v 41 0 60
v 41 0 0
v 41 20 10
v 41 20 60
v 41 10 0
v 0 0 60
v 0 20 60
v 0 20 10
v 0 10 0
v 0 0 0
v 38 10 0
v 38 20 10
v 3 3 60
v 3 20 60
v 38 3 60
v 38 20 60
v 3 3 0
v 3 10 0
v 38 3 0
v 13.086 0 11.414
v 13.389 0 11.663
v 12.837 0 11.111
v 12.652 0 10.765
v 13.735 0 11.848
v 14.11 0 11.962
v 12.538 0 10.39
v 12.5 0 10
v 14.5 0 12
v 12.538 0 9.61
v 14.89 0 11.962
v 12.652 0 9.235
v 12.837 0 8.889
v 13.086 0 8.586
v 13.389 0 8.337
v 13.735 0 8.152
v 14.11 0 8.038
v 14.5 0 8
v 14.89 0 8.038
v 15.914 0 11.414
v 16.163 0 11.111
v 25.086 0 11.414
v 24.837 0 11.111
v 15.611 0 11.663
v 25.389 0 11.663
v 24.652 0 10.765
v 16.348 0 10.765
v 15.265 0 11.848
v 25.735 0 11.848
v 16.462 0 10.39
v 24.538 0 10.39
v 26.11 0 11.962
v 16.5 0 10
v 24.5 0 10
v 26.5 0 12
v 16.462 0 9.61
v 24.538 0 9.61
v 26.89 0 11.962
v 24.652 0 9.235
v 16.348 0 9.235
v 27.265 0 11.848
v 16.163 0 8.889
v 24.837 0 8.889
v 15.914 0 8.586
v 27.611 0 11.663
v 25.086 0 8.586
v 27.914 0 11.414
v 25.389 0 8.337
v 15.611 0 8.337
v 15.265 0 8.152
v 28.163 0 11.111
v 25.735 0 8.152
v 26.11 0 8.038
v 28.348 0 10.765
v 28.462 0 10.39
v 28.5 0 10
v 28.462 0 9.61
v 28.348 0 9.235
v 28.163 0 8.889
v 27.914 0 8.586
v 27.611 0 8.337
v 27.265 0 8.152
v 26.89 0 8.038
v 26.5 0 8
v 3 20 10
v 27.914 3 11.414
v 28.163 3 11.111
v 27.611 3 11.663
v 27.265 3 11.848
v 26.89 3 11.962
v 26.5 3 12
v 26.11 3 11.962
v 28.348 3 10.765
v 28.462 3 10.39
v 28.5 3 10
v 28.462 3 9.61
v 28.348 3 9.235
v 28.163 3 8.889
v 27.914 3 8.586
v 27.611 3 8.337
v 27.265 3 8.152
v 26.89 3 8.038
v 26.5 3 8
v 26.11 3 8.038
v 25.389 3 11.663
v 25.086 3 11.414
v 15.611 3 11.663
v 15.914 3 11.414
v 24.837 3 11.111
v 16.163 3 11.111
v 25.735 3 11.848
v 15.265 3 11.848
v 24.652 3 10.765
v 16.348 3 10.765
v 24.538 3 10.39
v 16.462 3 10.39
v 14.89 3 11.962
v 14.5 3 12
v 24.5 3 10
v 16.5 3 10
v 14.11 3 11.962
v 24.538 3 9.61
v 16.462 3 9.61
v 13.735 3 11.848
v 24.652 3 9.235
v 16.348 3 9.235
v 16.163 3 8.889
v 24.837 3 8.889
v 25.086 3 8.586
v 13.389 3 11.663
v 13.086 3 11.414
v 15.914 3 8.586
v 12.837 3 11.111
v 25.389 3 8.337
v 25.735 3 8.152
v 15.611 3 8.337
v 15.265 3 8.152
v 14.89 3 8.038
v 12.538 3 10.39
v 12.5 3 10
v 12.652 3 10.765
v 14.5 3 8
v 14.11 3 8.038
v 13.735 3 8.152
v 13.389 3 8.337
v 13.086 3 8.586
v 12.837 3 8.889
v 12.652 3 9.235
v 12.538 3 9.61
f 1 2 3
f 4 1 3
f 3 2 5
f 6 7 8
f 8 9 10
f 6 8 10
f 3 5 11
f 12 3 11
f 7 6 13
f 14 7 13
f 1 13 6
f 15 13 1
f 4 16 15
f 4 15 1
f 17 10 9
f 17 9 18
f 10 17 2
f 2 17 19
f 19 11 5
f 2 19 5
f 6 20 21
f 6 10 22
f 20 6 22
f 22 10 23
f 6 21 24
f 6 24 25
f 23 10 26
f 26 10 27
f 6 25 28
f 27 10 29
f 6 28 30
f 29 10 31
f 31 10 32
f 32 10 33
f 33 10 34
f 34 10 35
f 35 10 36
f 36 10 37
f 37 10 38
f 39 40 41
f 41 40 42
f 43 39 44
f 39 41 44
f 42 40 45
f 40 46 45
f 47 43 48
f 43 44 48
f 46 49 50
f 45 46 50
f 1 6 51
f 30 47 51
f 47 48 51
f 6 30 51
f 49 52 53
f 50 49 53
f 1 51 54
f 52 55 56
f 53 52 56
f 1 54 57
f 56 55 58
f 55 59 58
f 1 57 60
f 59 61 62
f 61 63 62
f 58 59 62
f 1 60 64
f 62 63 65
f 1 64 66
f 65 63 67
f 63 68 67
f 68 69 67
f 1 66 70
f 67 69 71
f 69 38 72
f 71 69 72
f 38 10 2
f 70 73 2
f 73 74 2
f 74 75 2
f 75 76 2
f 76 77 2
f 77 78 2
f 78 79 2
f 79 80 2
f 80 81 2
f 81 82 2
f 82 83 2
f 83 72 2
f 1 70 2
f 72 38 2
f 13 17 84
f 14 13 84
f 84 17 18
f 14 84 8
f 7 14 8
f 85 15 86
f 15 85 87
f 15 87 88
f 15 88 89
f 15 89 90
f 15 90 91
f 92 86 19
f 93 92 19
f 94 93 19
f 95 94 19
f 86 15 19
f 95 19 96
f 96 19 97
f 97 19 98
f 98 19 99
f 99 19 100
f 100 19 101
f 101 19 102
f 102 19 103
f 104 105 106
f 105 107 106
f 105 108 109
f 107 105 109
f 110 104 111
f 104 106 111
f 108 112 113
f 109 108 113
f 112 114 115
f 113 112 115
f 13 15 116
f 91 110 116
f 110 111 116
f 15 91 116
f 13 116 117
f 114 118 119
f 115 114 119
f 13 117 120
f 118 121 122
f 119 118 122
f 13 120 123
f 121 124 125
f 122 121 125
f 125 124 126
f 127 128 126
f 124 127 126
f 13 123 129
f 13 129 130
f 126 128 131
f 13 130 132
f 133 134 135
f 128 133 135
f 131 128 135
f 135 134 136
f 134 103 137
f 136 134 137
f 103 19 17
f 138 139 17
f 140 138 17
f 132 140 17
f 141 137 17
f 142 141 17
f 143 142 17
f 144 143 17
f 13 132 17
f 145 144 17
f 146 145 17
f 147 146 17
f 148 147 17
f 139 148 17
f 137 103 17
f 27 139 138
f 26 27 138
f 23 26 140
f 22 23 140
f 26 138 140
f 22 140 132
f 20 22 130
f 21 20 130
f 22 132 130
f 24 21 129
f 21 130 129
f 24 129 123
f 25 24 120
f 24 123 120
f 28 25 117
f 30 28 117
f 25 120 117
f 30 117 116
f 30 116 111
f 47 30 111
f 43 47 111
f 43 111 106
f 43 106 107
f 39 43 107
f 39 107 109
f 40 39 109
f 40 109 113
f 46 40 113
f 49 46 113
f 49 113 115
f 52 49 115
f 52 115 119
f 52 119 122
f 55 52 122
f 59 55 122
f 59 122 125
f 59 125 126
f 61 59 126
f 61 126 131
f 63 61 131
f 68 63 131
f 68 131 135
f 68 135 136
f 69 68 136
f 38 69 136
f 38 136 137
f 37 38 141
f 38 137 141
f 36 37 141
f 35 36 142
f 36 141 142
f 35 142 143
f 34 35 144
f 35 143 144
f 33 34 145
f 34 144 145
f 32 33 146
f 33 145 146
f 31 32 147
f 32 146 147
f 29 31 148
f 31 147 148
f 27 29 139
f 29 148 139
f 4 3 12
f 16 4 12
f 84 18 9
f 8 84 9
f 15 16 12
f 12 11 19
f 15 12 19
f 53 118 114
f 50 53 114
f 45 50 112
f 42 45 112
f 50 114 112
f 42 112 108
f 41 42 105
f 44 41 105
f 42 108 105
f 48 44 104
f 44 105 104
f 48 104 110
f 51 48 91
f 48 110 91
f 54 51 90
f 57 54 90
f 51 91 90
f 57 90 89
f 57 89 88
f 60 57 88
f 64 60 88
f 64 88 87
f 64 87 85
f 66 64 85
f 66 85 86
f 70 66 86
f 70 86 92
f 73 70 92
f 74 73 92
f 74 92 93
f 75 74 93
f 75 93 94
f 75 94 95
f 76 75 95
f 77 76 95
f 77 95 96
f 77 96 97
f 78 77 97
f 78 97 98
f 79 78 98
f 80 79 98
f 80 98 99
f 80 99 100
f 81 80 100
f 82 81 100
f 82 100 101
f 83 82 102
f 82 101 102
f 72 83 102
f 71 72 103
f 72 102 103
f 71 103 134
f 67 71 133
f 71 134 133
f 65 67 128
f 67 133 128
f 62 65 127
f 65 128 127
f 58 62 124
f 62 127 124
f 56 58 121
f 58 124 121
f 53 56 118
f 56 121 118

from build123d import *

# Parameters (mm, degrees)
F1_DEPTH = 60
F2_SIZE  = 10
F3_R     = 2
F4_DEPTH = 25


with BuildPart() as f1:
    # F0 (on Top) → F1 (new body)
    with BuildSketch(Plane.XY):
        Polygon((0, 20), (0, 0), (41, 0), (41, 20), (38, 20), (38, 3), (3, 3), (3, 20), align=None)
    extrude(amount=F1_DEPTH)

    # F2
    f2_edges = [f1.edges().sort_by_distance(p)[0] for p in [
        (39.5, 20, 0),
        (1.5, 20, 0),
    ]]
    chamfer(f2_edges, length=F2_SIZE)

    # F3 (on face) → F4 (cut)
    with BuildSketch(Plane(origin=(0, 3, 0), x_dir=(-1, 0, 0), z_dir=(0, 1, 0))):
        with Locations((-14.5, 10)):
            Circle(F3_R)
        with Locations((-26.5, 10)):
            Circle(F3_R)
    extrude(amount=-F4_DEPTH, mode=Mode.SUBTRACT)


solid = f1.part
